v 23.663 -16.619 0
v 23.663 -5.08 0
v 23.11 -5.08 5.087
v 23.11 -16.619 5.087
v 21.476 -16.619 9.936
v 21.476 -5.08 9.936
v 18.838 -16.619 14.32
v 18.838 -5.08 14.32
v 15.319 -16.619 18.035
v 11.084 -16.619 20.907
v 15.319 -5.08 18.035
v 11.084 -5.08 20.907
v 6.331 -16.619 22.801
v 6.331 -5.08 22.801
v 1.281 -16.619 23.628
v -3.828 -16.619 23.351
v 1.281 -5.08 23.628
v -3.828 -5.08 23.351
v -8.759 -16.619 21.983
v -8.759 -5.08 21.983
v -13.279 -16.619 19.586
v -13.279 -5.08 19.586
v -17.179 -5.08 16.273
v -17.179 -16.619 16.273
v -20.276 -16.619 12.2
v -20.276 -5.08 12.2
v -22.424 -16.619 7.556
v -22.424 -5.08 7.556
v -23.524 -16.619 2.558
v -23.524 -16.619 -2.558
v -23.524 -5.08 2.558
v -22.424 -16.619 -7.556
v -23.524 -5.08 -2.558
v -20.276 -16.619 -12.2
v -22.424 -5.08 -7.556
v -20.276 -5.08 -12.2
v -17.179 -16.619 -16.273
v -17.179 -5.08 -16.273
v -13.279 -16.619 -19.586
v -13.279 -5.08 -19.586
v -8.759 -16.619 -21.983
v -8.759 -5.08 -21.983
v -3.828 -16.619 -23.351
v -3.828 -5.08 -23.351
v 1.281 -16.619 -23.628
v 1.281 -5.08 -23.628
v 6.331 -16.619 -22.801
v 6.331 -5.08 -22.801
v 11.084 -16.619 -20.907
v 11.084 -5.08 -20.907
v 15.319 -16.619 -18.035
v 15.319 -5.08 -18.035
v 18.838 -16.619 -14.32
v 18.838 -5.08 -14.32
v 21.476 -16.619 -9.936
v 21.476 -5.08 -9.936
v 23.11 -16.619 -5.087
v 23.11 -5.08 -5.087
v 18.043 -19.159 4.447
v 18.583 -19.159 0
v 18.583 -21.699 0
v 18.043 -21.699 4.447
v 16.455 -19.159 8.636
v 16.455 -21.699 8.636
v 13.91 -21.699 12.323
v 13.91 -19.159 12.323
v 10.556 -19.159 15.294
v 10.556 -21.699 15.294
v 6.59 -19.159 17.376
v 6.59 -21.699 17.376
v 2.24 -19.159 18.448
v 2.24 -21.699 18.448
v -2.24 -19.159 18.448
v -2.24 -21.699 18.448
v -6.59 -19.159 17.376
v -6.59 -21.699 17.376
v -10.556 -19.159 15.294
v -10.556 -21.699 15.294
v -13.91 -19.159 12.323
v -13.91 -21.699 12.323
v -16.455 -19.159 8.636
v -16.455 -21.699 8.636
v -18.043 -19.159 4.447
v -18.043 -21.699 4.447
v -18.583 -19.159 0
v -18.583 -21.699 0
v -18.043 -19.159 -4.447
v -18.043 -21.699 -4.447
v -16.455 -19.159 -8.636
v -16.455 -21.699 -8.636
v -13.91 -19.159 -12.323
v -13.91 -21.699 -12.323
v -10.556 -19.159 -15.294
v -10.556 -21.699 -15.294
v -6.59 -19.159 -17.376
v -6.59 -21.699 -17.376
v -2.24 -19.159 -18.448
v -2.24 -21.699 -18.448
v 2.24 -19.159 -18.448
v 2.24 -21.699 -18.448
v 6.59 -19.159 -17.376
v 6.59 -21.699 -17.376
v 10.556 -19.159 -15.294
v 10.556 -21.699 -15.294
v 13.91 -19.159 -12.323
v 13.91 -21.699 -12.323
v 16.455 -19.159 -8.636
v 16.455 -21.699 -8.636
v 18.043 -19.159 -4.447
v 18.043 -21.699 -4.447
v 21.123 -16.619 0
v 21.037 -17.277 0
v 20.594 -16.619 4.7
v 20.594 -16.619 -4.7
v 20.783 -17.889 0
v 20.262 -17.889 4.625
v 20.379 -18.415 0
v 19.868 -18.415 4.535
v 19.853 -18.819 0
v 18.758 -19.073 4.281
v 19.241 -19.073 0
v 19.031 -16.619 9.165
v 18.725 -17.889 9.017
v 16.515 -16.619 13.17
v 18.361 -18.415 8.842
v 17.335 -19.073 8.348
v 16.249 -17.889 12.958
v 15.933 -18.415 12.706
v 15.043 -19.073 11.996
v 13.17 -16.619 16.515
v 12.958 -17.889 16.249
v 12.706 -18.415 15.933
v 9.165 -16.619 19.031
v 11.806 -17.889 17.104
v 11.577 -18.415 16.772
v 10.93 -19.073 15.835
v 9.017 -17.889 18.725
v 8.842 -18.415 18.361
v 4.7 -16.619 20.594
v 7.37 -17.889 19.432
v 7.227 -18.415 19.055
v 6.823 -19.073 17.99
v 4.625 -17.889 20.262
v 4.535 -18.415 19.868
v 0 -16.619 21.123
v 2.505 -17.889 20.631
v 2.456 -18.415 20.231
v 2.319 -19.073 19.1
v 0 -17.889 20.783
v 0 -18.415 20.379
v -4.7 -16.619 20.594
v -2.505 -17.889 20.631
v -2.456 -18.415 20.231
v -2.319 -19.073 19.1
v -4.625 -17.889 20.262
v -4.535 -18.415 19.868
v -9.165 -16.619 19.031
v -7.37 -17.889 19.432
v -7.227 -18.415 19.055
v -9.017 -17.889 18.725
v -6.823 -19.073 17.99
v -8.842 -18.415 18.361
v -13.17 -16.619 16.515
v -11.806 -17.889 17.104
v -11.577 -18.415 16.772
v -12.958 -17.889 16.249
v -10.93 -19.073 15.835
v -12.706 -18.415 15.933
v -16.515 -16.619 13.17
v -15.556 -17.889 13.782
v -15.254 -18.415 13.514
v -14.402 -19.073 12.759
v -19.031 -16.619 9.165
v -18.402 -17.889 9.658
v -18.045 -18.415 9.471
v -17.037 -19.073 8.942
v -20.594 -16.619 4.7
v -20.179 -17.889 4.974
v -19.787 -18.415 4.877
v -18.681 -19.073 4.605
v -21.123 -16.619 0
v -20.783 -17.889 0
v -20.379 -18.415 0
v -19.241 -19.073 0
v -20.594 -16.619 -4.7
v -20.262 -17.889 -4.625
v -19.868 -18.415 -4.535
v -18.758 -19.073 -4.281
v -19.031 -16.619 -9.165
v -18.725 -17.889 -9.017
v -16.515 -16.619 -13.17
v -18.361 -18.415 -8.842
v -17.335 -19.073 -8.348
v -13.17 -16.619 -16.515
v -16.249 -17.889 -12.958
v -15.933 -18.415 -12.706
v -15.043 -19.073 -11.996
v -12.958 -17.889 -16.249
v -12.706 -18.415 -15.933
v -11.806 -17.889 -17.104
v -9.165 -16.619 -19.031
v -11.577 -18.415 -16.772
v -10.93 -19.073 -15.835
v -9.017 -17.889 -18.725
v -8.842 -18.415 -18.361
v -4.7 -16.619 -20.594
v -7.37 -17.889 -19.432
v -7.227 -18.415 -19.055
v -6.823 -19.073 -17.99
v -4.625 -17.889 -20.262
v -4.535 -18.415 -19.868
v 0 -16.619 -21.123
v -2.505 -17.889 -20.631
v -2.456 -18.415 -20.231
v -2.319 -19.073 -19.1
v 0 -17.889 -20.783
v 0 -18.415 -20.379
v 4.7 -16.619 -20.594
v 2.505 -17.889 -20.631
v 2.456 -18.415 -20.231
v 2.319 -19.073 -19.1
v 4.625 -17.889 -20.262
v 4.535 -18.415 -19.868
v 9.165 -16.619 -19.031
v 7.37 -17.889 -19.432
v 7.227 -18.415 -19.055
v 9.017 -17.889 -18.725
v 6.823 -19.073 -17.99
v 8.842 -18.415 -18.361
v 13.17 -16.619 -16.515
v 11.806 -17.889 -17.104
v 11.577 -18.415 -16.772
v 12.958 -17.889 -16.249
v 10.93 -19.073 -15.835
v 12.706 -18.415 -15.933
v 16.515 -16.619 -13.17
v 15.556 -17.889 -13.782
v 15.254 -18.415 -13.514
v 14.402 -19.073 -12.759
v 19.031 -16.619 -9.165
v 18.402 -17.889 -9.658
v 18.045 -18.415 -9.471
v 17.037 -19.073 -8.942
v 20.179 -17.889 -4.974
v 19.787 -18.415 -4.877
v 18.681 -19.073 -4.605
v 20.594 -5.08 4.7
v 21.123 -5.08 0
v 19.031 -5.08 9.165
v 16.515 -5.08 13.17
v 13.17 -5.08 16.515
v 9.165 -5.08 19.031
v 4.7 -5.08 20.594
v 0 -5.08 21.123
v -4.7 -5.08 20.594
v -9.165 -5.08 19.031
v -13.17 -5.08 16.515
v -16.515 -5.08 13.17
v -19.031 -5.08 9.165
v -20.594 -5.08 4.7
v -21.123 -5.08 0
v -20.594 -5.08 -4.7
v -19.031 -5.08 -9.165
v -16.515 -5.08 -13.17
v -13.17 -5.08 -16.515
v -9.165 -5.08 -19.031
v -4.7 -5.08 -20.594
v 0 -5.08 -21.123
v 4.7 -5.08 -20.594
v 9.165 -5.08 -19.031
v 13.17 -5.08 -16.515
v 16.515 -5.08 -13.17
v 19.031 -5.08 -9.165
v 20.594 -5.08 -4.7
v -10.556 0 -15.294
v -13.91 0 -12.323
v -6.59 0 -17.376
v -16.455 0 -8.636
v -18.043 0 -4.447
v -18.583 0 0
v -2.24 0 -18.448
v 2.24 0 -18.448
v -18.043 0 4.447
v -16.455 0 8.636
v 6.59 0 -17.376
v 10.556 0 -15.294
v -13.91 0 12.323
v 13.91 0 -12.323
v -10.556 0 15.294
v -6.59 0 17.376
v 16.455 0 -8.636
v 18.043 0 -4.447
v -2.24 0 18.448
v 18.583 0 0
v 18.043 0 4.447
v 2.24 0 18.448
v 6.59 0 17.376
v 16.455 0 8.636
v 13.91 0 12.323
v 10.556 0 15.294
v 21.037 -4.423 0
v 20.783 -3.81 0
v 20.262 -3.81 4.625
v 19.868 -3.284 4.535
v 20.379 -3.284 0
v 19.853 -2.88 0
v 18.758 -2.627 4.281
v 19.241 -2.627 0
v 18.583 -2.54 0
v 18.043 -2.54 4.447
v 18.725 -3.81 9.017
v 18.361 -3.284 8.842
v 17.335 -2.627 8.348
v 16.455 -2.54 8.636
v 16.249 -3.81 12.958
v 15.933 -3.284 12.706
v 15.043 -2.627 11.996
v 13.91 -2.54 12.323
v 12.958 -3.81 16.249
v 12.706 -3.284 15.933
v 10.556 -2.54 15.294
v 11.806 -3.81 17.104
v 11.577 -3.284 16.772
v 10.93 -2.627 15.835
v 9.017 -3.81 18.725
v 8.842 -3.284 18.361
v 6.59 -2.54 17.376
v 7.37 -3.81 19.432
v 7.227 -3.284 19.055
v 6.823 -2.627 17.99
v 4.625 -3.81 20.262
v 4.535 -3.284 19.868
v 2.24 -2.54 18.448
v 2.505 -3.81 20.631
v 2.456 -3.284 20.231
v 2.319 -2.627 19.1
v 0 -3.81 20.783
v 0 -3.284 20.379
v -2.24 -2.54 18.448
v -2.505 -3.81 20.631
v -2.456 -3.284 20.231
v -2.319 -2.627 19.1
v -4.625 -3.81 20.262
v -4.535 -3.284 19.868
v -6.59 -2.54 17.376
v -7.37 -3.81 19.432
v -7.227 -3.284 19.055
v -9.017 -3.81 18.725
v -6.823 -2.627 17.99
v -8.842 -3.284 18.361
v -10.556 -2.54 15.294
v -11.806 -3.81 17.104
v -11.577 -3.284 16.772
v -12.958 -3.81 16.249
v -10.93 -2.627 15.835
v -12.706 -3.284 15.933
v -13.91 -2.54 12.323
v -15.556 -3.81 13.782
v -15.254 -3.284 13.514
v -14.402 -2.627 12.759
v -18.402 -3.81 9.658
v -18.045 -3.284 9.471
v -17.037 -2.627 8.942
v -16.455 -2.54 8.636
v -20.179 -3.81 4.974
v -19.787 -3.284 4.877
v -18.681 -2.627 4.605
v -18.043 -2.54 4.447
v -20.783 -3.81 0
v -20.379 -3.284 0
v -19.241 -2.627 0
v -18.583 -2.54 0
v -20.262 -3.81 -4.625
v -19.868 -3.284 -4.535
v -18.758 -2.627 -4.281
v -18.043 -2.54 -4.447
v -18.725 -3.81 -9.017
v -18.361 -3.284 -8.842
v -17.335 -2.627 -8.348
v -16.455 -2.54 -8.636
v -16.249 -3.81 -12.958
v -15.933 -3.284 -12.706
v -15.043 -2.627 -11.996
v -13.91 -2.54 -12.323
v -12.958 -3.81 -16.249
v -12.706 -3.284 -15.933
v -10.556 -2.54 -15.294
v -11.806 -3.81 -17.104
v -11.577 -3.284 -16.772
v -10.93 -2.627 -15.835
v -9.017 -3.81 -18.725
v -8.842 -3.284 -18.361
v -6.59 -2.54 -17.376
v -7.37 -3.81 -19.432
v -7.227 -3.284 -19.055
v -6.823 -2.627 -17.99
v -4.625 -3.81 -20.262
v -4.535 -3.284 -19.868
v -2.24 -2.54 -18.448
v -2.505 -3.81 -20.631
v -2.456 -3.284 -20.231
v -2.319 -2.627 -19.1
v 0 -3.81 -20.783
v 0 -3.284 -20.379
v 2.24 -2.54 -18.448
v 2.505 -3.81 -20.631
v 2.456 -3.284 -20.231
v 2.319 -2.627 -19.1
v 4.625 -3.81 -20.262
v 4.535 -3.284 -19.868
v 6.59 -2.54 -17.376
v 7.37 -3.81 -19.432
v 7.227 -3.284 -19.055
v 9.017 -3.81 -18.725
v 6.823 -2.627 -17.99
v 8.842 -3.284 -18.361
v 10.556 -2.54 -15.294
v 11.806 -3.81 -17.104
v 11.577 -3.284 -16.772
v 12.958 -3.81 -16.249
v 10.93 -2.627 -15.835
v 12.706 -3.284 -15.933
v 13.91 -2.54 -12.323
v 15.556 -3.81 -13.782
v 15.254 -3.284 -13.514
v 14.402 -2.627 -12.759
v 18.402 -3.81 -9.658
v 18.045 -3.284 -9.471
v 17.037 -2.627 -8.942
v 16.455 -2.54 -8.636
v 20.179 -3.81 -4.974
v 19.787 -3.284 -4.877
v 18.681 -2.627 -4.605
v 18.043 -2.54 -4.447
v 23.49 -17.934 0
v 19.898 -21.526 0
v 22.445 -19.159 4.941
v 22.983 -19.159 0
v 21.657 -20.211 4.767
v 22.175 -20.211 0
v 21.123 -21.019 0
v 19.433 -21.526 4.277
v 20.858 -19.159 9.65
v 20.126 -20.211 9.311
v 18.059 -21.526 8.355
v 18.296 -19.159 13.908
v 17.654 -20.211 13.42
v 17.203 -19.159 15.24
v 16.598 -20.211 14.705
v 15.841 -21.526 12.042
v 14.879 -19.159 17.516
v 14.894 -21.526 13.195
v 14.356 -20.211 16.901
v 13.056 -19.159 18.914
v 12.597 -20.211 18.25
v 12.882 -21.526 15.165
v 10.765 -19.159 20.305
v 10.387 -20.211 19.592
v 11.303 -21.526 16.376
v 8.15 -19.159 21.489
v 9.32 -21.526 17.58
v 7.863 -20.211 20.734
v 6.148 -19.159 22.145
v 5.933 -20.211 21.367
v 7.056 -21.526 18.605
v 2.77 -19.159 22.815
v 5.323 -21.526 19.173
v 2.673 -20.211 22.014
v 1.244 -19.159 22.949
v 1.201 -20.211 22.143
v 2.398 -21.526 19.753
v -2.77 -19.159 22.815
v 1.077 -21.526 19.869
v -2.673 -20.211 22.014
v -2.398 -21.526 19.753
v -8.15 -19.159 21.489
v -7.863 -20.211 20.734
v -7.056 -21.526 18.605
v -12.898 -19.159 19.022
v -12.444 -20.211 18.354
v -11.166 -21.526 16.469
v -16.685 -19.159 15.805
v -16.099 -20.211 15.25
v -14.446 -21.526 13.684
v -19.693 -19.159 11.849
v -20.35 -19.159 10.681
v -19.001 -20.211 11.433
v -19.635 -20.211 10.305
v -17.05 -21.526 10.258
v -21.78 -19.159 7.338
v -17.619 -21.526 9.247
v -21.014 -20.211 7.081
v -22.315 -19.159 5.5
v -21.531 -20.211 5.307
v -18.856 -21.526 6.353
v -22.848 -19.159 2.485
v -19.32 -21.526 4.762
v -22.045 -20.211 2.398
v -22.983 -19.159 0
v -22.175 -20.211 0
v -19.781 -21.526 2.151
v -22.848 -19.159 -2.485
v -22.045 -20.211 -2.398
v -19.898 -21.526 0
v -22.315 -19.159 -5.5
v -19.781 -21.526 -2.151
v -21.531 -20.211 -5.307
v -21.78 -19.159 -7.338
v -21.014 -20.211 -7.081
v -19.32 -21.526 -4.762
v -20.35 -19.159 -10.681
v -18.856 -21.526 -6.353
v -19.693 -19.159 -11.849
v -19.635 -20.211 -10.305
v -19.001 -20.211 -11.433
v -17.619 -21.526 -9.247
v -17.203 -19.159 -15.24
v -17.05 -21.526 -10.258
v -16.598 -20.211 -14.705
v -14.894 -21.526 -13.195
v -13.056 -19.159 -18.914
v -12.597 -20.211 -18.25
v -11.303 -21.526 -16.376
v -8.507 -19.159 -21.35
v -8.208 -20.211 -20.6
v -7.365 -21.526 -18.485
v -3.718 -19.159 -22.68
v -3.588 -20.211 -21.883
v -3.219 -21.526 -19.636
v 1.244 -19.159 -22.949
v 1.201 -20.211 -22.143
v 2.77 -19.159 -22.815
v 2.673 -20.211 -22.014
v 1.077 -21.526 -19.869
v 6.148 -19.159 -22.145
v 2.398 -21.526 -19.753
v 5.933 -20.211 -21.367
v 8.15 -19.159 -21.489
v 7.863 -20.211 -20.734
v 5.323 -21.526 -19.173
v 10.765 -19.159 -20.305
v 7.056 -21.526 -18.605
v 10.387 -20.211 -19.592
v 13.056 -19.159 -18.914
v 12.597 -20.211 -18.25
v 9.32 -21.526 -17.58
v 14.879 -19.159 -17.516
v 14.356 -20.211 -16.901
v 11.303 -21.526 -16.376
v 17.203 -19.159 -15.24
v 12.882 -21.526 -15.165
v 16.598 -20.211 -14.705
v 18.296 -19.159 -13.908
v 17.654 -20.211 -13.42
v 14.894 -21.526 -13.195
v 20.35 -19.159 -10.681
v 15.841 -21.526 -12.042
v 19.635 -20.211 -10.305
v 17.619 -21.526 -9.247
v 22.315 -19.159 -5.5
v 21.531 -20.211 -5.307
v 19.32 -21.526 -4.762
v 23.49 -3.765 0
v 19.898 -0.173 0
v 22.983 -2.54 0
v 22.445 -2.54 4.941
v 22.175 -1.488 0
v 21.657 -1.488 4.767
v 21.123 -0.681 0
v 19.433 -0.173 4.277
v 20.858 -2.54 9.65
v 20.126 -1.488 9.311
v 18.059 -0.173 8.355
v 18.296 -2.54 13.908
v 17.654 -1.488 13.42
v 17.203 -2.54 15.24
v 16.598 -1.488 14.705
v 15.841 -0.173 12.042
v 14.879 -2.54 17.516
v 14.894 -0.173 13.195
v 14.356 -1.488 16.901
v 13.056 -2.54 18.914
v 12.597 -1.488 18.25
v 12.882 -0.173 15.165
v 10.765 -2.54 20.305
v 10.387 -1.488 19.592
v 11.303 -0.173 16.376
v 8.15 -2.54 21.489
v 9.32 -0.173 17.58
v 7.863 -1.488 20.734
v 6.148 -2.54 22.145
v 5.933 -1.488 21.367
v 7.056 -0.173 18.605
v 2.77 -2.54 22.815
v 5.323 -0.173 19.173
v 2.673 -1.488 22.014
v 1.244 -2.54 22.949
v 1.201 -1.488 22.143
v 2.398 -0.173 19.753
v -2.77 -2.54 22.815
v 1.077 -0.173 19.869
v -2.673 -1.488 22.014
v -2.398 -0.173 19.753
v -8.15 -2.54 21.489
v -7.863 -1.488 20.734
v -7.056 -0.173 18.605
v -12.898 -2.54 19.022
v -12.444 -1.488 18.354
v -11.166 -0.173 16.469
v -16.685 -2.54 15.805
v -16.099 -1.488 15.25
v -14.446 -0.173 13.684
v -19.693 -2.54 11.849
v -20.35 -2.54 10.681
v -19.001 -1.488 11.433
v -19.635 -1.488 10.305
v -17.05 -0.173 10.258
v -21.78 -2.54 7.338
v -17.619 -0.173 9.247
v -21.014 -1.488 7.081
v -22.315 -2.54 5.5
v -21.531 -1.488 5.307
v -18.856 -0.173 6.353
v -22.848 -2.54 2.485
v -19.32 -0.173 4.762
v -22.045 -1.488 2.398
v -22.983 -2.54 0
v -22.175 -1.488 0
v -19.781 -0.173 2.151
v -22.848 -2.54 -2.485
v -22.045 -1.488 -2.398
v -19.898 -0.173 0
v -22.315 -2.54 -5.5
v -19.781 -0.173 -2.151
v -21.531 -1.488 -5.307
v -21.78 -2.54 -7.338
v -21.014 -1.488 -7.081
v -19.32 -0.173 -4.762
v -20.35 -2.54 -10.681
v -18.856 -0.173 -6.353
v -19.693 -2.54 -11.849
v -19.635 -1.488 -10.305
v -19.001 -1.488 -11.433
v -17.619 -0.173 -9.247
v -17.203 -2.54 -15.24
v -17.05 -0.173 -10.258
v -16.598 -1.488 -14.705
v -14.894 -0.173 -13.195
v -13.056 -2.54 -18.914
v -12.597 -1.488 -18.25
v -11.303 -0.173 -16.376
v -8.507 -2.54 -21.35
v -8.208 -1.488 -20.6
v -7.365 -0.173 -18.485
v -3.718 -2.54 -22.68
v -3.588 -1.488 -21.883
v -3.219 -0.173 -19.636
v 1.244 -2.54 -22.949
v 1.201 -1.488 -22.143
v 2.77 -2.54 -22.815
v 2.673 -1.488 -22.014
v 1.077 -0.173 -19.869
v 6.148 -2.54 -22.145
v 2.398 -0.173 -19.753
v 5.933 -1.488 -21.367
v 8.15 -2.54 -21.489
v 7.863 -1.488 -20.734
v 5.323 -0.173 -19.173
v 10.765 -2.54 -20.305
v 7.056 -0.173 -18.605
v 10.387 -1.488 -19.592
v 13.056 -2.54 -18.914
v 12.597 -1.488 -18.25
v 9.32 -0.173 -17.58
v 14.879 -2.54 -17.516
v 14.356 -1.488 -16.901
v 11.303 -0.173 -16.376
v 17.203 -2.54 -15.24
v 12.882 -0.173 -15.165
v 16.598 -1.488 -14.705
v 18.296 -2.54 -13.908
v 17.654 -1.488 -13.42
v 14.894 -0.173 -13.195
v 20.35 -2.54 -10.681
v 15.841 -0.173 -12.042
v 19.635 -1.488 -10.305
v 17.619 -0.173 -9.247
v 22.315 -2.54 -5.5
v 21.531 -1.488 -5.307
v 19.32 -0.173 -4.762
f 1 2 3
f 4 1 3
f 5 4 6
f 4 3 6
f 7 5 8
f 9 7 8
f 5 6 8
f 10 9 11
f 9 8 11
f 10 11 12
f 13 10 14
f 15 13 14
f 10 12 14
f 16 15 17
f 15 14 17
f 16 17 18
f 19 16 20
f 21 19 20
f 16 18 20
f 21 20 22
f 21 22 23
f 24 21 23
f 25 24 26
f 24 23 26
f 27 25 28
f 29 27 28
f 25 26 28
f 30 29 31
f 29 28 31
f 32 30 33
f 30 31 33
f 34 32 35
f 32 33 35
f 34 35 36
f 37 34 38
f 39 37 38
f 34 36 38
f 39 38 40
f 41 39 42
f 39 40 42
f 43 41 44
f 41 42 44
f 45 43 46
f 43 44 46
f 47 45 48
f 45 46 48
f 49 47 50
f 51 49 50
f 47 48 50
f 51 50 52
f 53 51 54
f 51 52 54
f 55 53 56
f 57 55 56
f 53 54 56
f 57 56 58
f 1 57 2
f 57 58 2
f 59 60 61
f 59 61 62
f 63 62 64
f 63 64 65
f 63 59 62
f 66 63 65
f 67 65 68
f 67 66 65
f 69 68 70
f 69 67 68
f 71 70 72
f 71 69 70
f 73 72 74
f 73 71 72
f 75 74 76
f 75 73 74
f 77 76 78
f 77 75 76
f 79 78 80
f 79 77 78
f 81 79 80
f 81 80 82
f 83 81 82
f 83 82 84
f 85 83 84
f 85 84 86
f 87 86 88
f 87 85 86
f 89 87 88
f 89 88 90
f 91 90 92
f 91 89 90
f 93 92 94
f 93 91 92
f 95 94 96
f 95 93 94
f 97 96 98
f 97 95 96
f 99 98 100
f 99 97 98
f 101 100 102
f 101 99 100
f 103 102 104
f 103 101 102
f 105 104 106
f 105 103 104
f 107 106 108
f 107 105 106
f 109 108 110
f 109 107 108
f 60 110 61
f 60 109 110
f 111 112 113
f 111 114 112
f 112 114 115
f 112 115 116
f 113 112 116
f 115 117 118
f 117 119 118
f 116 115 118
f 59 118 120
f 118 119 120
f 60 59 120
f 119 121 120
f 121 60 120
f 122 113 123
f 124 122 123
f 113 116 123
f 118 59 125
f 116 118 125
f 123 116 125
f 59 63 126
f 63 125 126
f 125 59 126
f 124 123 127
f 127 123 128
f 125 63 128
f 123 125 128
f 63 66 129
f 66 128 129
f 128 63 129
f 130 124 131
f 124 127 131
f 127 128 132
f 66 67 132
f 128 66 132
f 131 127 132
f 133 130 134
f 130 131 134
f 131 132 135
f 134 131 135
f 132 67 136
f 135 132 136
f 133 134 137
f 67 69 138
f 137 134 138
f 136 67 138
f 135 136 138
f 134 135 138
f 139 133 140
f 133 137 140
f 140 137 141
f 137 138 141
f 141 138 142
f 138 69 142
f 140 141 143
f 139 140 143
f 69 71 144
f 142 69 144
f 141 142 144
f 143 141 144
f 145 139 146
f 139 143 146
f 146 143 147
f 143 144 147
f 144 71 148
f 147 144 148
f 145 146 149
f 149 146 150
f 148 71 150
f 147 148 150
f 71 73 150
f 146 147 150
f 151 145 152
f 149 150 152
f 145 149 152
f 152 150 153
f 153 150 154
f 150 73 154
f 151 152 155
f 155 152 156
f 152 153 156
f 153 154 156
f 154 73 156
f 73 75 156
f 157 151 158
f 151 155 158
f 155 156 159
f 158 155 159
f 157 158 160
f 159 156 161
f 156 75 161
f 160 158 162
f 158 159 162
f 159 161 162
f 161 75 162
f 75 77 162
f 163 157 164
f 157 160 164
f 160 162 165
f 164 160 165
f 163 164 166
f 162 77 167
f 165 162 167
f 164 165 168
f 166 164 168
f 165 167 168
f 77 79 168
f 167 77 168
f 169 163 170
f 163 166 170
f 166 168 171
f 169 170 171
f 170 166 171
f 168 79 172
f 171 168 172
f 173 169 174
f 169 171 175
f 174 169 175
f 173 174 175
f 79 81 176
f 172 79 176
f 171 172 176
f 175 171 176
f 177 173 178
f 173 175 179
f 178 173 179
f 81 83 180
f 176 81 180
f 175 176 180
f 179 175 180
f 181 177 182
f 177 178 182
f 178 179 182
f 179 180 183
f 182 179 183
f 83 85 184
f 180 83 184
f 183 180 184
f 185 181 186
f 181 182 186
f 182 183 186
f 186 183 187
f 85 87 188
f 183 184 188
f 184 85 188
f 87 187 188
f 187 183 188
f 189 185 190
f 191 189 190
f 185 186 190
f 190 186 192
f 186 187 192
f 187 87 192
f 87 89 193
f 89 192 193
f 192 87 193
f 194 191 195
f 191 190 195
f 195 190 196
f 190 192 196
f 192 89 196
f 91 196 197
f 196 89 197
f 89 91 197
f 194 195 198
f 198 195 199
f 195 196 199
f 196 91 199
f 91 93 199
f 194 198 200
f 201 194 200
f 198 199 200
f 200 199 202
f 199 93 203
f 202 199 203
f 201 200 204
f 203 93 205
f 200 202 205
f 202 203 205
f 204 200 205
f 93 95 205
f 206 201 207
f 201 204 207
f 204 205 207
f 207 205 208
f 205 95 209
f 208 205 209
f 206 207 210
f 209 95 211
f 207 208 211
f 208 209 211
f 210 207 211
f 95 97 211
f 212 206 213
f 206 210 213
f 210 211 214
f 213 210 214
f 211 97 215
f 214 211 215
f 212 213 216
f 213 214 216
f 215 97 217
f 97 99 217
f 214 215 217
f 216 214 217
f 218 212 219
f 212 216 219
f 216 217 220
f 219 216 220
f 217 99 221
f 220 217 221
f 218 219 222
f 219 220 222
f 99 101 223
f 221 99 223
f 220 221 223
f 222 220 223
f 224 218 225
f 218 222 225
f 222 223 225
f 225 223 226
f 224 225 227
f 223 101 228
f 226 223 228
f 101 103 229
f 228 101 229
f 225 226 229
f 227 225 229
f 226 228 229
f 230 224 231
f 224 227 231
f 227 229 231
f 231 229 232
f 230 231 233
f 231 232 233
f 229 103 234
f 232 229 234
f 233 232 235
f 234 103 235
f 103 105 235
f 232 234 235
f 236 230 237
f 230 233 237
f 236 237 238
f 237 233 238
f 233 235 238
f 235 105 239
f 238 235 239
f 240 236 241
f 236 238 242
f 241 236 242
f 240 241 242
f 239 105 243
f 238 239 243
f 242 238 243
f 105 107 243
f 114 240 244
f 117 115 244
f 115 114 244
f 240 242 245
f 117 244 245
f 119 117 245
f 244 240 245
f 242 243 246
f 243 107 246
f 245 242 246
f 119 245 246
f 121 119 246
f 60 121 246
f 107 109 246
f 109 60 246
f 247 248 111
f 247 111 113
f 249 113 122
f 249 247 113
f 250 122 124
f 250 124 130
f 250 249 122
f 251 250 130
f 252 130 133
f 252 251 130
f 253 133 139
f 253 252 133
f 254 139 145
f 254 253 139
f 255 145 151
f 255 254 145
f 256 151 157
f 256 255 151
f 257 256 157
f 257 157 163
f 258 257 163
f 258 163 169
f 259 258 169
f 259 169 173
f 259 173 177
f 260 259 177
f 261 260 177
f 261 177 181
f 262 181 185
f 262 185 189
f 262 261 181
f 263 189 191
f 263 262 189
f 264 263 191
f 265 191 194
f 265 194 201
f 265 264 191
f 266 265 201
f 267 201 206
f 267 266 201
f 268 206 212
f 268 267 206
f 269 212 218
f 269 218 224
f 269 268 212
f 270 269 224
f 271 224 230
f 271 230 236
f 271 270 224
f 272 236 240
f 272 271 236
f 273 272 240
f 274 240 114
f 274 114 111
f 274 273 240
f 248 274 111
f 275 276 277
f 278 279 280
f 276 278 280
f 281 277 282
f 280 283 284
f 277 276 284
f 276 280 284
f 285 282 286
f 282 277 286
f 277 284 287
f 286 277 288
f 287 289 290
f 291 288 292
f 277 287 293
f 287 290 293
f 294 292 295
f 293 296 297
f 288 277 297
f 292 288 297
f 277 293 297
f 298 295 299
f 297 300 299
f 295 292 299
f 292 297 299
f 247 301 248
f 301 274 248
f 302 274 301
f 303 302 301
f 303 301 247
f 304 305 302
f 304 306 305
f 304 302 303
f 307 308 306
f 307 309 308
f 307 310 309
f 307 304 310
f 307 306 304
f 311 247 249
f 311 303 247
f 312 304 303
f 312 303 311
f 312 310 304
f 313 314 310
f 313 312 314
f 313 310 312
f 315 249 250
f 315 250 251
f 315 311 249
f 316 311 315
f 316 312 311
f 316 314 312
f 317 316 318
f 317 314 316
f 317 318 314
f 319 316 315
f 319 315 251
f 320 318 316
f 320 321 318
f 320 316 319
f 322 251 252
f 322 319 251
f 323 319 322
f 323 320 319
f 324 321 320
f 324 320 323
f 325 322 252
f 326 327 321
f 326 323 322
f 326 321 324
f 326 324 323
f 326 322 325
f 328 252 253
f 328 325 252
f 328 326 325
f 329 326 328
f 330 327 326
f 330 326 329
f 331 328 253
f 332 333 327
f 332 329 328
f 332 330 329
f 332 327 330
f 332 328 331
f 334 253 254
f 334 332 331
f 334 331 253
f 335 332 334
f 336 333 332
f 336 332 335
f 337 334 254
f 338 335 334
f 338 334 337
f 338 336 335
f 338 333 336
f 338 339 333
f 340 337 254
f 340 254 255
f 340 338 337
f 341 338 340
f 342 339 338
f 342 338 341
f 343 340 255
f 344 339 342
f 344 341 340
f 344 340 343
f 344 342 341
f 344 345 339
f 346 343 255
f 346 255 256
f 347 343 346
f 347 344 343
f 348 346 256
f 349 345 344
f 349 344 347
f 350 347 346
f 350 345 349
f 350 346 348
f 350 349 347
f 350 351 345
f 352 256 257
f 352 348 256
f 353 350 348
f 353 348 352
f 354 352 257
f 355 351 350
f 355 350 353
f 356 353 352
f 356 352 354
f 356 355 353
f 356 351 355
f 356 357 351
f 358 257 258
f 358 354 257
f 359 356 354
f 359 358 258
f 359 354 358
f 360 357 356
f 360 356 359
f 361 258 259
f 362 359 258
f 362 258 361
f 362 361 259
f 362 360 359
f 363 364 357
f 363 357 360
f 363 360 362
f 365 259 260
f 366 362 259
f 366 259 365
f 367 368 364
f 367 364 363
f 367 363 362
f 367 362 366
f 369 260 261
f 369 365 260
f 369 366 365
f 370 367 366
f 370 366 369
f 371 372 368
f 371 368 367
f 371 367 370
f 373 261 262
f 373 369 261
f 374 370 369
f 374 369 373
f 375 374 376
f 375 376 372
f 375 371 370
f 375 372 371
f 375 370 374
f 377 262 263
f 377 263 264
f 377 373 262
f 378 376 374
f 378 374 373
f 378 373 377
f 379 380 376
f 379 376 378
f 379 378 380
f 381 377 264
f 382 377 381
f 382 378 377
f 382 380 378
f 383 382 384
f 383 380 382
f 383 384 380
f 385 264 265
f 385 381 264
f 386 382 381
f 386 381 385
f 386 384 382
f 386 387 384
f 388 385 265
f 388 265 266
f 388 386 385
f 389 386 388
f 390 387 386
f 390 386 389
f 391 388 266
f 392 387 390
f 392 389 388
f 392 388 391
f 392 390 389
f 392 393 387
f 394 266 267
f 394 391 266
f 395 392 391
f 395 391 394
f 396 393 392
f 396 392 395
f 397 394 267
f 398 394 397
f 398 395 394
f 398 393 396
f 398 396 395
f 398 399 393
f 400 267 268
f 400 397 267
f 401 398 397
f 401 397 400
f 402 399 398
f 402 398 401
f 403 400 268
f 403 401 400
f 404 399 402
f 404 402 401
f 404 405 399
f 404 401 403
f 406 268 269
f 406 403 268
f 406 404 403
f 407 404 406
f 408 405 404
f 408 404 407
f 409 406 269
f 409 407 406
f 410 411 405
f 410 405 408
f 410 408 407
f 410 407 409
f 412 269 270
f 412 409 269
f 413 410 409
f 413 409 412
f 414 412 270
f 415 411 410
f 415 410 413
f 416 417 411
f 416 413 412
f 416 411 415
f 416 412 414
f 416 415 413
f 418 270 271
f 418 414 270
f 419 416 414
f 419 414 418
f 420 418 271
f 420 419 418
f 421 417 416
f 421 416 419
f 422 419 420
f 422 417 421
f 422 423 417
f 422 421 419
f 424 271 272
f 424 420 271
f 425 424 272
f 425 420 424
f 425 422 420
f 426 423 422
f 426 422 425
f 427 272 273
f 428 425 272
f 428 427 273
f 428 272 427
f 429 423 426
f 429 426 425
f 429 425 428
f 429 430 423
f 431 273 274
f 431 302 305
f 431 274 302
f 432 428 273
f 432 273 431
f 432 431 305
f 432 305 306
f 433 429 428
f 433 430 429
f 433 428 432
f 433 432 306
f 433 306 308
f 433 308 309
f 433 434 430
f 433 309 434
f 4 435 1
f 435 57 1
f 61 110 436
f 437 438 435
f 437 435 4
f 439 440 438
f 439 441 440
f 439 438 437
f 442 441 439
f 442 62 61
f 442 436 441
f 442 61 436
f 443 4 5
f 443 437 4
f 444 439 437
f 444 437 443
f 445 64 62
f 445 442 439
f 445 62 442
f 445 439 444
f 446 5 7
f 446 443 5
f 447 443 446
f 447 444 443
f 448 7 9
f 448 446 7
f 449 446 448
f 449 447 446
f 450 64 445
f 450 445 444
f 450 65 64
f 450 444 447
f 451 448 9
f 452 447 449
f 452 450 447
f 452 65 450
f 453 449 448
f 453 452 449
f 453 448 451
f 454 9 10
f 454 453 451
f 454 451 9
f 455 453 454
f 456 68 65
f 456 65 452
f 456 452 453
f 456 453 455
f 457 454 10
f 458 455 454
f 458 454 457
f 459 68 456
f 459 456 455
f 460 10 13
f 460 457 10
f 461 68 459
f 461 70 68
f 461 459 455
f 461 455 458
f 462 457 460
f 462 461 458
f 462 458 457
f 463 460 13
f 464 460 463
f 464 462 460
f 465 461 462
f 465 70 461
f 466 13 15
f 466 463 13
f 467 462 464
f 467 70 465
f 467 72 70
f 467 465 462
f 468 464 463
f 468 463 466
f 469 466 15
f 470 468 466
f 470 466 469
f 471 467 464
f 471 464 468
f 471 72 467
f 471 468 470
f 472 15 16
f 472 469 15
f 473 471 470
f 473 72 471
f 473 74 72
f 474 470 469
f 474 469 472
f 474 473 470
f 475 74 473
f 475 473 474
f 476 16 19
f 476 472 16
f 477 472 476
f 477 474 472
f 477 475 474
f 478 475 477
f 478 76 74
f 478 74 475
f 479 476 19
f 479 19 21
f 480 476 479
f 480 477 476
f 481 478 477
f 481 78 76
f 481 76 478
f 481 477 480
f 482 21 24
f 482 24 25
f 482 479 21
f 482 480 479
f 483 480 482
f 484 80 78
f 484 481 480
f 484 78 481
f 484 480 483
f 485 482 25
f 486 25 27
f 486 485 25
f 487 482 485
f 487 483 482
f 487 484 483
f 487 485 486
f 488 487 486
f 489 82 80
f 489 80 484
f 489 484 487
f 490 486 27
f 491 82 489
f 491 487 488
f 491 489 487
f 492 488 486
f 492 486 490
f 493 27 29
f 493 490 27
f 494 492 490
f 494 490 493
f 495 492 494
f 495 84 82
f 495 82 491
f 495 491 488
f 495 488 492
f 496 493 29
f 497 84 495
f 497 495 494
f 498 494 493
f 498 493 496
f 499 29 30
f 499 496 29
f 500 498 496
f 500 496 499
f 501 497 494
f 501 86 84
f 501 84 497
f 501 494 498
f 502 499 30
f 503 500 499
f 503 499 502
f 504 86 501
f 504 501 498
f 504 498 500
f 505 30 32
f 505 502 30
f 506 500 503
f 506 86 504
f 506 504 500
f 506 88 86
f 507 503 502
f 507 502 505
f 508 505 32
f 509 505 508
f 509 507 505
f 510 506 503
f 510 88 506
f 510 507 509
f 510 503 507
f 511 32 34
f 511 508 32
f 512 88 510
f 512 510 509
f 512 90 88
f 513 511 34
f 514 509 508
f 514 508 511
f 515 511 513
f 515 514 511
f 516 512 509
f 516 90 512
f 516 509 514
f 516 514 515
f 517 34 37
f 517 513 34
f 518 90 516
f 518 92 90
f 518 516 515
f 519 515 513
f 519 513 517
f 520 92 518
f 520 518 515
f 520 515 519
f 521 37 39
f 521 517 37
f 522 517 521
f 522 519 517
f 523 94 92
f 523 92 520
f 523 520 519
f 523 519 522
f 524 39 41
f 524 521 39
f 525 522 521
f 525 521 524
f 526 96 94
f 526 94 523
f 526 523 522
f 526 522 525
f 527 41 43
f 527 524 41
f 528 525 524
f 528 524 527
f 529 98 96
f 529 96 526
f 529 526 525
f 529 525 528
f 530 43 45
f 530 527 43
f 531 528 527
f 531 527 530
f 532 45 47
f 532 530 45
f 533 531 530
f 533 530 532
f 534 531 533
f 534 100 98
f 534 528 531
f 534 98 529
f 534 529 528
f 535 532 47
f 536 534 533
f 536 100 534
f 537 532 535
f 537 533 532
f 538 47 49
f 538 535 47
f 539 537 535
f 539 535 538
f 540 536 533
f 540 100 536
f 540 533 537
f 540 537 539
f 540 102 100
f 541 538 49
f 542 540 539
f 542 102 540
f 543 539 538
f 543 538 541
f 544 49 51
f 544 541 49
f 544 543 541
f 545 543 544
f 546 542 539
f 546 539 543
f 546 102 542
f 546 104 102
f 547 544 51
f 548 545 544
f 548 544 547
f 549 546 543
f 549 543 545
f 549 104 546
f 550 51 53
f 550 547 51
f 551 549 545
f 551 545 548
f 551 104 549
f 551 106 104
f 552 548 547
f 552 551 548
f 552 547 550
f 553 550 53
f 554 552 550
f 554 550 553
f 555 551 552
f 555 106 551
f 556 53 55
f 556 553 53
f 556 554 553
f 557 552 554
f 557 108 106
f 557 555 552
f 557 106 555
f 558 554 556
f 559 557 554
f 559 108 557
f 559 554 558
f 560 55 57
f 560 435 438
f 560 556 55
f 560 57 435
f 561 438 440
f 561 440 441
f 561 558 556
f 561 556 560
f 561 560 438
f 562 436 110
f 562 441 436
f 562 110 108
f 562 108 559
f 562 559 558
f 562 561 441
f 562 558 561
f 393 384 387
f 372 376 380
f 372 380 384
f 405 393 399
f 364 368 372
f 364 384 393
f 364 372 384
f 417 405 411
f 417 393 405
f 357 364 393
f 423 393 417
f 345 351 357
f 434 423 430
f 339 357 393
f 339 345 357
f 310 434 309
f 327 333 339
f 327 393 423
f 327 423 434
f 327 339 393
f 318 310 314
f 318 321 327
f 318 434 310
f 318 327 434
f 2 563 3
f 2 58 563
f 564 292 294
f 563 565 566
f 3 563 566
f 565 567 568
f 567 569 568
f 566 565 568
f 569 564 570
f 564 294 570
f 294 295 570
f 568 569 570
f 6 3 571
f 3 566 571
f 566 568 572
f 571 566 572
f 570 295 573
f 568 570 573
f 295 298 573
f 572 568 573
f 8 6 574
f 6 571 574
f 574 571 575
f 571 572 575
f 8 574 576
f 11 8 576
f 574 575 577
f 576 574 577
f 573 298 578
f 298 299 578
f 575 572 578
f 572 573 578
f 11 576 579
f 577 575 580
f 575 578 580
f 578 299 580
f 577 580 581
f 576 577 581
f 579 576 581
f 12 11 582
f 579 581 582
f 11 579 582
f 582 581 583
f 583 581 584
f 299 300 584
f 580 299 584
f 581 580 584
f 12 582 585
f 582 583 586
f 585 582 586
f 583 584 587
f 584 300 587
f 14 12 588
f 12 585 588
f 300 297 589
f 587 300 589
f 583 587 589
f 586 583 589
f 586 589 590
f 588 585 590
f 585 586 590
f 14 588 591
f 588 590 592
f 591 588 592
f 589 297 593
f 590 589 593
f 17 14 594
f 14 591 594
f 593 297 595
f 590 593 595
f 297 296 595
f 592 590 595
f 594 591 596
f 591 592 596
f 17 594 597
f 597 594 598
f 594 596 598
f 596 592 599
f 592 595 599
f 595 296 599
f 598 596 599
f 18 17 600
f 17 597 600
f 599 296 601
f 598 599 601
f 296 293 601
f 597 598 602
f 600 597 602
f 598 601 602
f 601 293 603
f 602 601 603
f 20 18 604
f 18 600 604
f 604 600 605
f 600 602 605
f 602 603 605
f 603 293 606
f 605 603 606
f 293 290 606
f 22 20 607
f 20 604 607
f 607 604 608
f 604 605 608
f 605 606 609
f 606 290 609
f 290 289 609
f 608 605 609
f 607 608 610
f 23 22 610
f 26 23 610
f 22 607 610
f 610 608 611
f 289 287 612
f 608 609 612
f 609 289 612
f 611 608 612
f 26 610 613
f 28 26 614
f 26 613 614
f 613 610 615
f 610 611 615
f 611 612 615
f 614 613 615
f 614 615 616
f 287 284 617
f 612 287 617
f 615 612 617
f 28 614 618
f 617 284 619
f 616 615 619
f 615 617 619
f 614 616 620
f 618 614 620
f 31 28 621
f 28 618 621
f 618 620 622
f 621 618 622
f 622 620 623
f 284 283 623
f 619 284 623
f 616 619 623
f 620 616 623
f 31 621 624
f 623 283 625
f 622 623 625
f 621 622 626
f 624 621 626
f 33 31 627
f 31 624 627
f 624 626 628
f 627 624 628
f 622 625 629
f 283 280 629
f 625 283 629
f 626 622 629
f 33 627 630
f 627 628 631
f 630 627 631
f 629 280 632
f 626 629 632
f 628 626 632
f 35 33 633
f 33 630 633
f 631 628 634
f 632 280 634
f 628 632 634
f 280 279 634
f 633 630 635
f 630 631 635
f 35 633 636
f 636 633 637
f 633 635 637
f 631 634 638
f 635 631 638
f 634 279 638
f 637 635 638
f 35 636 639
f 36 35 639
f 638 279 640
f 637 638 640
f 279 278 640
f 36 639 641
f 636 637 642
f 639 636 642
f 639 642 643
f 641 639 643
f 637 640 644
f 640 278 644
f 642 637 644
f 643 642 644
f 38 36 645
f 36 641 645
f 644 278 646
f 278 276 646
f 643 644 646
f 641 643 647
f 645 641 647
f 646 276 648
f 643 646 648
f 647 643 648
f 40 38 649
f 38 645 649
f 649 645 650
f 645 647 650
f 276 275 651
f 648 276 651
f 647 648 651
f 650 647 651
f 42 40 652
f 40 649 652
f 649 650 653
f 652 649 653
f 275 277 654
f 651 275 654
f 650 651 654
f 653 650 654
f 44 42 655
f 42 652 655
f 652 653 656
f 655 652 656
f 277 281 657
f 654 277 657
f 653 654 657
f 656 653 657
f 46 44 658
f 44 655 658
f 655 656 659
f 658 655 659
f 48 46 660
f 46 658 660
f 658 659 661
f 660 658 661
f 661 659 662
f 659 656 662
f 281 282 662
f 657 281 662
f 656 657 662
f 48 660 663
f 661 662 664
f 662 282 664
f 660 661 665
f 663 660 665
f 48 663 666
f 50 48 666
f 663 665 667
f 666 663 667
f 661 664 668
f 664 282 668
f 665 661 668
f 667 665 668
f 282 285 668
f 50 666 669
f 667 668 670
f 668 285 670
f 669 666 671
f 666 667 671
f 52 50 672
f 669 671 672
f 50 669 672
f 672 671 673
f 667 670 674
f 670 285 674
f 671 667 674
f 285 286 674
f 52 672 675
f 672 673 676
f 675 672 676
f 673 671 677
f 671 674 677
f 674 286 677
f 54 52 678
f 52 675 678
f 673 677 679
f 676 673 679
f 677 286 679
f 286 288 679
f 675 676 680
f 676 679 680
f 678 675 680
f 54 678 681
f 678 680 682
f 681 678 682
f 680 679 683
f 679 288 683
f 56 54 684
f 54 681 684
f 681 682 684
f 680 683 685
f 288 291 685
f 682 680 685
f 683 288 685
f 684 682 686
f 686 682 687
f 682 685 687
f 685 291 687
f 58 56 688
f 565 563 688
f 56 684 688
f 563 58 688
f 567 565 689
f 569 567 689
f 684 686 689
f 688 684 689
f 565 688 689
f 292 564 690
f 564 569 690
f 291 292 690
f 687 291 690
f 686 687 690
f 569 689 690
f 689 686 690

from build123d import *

# Parameters (mm, degrees)
F0_R     = 23.6631657712
F1_DEPTH = 21.69927
F2_R     = 5.08
F3_T     = -2.54


# Not quite as in the source:
# - a shell that OpenCascade refuses in one call is made with other operations: the cavity is built on its own and cut out


with BuildPart() as f1:
    # F0 (on Front) → F1 (new body)
    with BuildSketch(Plane.XZ):
        Circle(F0_R)
    extrude(amount=F1_DEPTH)

    # F2
    f2_edges = [f1.edges().sort_by_distance(p)[0] for p in [
        (-23.663166, -21.69927, 0),
        (-23.663166, 0, 0),
    ]]
    fillet(f2_edges, radius=F2_R)

    # F3: a shell. OpenCascade refuses it in one call, so the cavity is built on its own and cut out:
    # the body offset inwards by the wall thickness, plus a prism from it out through each open face.
    f3_core = offset(f1.part, amount=F3_T, mode=Mode.PRIVATE)
    f3_exits = [f3_core.faces().sort_by_distance(p)[0] for p in [
        (0, -19.15927, 0),
    ]]
    add(f3_core, mode=Mode.SUBTRACT)
    extrude(f3_exits, amount=-F3_T, mode=Mode.SUBTRACT)


solid = f1.part
